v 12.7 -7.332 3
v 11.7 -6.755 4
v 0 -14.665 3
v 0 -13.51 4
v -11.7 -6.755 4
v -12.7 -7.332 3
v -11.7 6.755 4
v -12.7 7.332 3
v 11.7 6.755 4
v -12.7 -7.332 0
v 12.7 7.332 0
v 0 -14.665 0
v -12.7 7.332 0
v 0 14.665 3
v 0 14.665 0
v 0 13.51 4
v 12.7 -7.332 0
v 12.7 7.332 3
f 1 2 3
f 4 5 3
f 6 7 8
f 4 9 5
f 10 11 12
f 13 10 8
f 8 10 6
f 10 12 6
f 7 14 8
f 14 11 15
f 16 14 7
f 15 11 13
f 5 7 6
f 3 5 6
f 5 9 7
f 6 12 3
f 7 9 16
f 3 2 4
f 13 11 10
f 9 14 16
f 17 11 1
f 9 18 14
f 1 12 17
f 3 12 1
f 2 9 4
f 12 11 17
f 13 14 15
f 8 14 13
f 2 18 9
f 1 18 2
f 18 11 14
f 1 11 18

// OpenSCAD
//============================================================
// OpenSCAD
// Licence : LICENCE PUBLIQUE RIEN À BRANLER
// Licence : do What The Fuck you want to Public License
//============================================================
/*

	Usage:
	use <Hexagones.scad>;
	Pour créer des jeux, des têtes de vis...

*/


//------------------------------------------------------------
// Demo
//------------------------------------------------------------
$fn = 150 ;			// OpenSCAD Resolution
// hexagone de 1 pouce (1 inch) soit 25.4 mm
hull() {


	translate([0,0,1.5])
		Hexagon(cle=25.4,h=3);
	translate([0,0,2])
	Hexagon(cle=23.4,h=4);
}
//------------------------------------------------------------
// Hexagone
// cle	écart, ex: clé de 12 alors cle=12
// h		hauteur
//------------------------------------------------------------
module Hexagon(cle,h)
{
	angle = 360/6;		// 6 pans
	cote = cle * cot(angle);
	echo(angle, cot(angle), cote);
	echo(acos(.6));

	union()
	{
		rotate([0,0,0])
			cube([cle,cote,h],center=true);
		rotate([0,0,angle])
			cube([cle,cote,h],center=true);
		rotate([0,0,2*angle])
			cube([cle,cote,h],center=true);
	}

// Vérification par un cercle de taille cle
//	#cylinder(r=cle/2,h=2*h,center=true);
//	%circle(r=cote,center=true);
//	#cube([cote,cote,1]);
}

//------------------------------------------------------------
// Fonction cotangente
// Permet d'avoir les bones dimensions
// utiliser $fn n'est pas bon
//------------------------------------------------------------
function cot(x)=1/tan(x);

//==EOF=======================================================
